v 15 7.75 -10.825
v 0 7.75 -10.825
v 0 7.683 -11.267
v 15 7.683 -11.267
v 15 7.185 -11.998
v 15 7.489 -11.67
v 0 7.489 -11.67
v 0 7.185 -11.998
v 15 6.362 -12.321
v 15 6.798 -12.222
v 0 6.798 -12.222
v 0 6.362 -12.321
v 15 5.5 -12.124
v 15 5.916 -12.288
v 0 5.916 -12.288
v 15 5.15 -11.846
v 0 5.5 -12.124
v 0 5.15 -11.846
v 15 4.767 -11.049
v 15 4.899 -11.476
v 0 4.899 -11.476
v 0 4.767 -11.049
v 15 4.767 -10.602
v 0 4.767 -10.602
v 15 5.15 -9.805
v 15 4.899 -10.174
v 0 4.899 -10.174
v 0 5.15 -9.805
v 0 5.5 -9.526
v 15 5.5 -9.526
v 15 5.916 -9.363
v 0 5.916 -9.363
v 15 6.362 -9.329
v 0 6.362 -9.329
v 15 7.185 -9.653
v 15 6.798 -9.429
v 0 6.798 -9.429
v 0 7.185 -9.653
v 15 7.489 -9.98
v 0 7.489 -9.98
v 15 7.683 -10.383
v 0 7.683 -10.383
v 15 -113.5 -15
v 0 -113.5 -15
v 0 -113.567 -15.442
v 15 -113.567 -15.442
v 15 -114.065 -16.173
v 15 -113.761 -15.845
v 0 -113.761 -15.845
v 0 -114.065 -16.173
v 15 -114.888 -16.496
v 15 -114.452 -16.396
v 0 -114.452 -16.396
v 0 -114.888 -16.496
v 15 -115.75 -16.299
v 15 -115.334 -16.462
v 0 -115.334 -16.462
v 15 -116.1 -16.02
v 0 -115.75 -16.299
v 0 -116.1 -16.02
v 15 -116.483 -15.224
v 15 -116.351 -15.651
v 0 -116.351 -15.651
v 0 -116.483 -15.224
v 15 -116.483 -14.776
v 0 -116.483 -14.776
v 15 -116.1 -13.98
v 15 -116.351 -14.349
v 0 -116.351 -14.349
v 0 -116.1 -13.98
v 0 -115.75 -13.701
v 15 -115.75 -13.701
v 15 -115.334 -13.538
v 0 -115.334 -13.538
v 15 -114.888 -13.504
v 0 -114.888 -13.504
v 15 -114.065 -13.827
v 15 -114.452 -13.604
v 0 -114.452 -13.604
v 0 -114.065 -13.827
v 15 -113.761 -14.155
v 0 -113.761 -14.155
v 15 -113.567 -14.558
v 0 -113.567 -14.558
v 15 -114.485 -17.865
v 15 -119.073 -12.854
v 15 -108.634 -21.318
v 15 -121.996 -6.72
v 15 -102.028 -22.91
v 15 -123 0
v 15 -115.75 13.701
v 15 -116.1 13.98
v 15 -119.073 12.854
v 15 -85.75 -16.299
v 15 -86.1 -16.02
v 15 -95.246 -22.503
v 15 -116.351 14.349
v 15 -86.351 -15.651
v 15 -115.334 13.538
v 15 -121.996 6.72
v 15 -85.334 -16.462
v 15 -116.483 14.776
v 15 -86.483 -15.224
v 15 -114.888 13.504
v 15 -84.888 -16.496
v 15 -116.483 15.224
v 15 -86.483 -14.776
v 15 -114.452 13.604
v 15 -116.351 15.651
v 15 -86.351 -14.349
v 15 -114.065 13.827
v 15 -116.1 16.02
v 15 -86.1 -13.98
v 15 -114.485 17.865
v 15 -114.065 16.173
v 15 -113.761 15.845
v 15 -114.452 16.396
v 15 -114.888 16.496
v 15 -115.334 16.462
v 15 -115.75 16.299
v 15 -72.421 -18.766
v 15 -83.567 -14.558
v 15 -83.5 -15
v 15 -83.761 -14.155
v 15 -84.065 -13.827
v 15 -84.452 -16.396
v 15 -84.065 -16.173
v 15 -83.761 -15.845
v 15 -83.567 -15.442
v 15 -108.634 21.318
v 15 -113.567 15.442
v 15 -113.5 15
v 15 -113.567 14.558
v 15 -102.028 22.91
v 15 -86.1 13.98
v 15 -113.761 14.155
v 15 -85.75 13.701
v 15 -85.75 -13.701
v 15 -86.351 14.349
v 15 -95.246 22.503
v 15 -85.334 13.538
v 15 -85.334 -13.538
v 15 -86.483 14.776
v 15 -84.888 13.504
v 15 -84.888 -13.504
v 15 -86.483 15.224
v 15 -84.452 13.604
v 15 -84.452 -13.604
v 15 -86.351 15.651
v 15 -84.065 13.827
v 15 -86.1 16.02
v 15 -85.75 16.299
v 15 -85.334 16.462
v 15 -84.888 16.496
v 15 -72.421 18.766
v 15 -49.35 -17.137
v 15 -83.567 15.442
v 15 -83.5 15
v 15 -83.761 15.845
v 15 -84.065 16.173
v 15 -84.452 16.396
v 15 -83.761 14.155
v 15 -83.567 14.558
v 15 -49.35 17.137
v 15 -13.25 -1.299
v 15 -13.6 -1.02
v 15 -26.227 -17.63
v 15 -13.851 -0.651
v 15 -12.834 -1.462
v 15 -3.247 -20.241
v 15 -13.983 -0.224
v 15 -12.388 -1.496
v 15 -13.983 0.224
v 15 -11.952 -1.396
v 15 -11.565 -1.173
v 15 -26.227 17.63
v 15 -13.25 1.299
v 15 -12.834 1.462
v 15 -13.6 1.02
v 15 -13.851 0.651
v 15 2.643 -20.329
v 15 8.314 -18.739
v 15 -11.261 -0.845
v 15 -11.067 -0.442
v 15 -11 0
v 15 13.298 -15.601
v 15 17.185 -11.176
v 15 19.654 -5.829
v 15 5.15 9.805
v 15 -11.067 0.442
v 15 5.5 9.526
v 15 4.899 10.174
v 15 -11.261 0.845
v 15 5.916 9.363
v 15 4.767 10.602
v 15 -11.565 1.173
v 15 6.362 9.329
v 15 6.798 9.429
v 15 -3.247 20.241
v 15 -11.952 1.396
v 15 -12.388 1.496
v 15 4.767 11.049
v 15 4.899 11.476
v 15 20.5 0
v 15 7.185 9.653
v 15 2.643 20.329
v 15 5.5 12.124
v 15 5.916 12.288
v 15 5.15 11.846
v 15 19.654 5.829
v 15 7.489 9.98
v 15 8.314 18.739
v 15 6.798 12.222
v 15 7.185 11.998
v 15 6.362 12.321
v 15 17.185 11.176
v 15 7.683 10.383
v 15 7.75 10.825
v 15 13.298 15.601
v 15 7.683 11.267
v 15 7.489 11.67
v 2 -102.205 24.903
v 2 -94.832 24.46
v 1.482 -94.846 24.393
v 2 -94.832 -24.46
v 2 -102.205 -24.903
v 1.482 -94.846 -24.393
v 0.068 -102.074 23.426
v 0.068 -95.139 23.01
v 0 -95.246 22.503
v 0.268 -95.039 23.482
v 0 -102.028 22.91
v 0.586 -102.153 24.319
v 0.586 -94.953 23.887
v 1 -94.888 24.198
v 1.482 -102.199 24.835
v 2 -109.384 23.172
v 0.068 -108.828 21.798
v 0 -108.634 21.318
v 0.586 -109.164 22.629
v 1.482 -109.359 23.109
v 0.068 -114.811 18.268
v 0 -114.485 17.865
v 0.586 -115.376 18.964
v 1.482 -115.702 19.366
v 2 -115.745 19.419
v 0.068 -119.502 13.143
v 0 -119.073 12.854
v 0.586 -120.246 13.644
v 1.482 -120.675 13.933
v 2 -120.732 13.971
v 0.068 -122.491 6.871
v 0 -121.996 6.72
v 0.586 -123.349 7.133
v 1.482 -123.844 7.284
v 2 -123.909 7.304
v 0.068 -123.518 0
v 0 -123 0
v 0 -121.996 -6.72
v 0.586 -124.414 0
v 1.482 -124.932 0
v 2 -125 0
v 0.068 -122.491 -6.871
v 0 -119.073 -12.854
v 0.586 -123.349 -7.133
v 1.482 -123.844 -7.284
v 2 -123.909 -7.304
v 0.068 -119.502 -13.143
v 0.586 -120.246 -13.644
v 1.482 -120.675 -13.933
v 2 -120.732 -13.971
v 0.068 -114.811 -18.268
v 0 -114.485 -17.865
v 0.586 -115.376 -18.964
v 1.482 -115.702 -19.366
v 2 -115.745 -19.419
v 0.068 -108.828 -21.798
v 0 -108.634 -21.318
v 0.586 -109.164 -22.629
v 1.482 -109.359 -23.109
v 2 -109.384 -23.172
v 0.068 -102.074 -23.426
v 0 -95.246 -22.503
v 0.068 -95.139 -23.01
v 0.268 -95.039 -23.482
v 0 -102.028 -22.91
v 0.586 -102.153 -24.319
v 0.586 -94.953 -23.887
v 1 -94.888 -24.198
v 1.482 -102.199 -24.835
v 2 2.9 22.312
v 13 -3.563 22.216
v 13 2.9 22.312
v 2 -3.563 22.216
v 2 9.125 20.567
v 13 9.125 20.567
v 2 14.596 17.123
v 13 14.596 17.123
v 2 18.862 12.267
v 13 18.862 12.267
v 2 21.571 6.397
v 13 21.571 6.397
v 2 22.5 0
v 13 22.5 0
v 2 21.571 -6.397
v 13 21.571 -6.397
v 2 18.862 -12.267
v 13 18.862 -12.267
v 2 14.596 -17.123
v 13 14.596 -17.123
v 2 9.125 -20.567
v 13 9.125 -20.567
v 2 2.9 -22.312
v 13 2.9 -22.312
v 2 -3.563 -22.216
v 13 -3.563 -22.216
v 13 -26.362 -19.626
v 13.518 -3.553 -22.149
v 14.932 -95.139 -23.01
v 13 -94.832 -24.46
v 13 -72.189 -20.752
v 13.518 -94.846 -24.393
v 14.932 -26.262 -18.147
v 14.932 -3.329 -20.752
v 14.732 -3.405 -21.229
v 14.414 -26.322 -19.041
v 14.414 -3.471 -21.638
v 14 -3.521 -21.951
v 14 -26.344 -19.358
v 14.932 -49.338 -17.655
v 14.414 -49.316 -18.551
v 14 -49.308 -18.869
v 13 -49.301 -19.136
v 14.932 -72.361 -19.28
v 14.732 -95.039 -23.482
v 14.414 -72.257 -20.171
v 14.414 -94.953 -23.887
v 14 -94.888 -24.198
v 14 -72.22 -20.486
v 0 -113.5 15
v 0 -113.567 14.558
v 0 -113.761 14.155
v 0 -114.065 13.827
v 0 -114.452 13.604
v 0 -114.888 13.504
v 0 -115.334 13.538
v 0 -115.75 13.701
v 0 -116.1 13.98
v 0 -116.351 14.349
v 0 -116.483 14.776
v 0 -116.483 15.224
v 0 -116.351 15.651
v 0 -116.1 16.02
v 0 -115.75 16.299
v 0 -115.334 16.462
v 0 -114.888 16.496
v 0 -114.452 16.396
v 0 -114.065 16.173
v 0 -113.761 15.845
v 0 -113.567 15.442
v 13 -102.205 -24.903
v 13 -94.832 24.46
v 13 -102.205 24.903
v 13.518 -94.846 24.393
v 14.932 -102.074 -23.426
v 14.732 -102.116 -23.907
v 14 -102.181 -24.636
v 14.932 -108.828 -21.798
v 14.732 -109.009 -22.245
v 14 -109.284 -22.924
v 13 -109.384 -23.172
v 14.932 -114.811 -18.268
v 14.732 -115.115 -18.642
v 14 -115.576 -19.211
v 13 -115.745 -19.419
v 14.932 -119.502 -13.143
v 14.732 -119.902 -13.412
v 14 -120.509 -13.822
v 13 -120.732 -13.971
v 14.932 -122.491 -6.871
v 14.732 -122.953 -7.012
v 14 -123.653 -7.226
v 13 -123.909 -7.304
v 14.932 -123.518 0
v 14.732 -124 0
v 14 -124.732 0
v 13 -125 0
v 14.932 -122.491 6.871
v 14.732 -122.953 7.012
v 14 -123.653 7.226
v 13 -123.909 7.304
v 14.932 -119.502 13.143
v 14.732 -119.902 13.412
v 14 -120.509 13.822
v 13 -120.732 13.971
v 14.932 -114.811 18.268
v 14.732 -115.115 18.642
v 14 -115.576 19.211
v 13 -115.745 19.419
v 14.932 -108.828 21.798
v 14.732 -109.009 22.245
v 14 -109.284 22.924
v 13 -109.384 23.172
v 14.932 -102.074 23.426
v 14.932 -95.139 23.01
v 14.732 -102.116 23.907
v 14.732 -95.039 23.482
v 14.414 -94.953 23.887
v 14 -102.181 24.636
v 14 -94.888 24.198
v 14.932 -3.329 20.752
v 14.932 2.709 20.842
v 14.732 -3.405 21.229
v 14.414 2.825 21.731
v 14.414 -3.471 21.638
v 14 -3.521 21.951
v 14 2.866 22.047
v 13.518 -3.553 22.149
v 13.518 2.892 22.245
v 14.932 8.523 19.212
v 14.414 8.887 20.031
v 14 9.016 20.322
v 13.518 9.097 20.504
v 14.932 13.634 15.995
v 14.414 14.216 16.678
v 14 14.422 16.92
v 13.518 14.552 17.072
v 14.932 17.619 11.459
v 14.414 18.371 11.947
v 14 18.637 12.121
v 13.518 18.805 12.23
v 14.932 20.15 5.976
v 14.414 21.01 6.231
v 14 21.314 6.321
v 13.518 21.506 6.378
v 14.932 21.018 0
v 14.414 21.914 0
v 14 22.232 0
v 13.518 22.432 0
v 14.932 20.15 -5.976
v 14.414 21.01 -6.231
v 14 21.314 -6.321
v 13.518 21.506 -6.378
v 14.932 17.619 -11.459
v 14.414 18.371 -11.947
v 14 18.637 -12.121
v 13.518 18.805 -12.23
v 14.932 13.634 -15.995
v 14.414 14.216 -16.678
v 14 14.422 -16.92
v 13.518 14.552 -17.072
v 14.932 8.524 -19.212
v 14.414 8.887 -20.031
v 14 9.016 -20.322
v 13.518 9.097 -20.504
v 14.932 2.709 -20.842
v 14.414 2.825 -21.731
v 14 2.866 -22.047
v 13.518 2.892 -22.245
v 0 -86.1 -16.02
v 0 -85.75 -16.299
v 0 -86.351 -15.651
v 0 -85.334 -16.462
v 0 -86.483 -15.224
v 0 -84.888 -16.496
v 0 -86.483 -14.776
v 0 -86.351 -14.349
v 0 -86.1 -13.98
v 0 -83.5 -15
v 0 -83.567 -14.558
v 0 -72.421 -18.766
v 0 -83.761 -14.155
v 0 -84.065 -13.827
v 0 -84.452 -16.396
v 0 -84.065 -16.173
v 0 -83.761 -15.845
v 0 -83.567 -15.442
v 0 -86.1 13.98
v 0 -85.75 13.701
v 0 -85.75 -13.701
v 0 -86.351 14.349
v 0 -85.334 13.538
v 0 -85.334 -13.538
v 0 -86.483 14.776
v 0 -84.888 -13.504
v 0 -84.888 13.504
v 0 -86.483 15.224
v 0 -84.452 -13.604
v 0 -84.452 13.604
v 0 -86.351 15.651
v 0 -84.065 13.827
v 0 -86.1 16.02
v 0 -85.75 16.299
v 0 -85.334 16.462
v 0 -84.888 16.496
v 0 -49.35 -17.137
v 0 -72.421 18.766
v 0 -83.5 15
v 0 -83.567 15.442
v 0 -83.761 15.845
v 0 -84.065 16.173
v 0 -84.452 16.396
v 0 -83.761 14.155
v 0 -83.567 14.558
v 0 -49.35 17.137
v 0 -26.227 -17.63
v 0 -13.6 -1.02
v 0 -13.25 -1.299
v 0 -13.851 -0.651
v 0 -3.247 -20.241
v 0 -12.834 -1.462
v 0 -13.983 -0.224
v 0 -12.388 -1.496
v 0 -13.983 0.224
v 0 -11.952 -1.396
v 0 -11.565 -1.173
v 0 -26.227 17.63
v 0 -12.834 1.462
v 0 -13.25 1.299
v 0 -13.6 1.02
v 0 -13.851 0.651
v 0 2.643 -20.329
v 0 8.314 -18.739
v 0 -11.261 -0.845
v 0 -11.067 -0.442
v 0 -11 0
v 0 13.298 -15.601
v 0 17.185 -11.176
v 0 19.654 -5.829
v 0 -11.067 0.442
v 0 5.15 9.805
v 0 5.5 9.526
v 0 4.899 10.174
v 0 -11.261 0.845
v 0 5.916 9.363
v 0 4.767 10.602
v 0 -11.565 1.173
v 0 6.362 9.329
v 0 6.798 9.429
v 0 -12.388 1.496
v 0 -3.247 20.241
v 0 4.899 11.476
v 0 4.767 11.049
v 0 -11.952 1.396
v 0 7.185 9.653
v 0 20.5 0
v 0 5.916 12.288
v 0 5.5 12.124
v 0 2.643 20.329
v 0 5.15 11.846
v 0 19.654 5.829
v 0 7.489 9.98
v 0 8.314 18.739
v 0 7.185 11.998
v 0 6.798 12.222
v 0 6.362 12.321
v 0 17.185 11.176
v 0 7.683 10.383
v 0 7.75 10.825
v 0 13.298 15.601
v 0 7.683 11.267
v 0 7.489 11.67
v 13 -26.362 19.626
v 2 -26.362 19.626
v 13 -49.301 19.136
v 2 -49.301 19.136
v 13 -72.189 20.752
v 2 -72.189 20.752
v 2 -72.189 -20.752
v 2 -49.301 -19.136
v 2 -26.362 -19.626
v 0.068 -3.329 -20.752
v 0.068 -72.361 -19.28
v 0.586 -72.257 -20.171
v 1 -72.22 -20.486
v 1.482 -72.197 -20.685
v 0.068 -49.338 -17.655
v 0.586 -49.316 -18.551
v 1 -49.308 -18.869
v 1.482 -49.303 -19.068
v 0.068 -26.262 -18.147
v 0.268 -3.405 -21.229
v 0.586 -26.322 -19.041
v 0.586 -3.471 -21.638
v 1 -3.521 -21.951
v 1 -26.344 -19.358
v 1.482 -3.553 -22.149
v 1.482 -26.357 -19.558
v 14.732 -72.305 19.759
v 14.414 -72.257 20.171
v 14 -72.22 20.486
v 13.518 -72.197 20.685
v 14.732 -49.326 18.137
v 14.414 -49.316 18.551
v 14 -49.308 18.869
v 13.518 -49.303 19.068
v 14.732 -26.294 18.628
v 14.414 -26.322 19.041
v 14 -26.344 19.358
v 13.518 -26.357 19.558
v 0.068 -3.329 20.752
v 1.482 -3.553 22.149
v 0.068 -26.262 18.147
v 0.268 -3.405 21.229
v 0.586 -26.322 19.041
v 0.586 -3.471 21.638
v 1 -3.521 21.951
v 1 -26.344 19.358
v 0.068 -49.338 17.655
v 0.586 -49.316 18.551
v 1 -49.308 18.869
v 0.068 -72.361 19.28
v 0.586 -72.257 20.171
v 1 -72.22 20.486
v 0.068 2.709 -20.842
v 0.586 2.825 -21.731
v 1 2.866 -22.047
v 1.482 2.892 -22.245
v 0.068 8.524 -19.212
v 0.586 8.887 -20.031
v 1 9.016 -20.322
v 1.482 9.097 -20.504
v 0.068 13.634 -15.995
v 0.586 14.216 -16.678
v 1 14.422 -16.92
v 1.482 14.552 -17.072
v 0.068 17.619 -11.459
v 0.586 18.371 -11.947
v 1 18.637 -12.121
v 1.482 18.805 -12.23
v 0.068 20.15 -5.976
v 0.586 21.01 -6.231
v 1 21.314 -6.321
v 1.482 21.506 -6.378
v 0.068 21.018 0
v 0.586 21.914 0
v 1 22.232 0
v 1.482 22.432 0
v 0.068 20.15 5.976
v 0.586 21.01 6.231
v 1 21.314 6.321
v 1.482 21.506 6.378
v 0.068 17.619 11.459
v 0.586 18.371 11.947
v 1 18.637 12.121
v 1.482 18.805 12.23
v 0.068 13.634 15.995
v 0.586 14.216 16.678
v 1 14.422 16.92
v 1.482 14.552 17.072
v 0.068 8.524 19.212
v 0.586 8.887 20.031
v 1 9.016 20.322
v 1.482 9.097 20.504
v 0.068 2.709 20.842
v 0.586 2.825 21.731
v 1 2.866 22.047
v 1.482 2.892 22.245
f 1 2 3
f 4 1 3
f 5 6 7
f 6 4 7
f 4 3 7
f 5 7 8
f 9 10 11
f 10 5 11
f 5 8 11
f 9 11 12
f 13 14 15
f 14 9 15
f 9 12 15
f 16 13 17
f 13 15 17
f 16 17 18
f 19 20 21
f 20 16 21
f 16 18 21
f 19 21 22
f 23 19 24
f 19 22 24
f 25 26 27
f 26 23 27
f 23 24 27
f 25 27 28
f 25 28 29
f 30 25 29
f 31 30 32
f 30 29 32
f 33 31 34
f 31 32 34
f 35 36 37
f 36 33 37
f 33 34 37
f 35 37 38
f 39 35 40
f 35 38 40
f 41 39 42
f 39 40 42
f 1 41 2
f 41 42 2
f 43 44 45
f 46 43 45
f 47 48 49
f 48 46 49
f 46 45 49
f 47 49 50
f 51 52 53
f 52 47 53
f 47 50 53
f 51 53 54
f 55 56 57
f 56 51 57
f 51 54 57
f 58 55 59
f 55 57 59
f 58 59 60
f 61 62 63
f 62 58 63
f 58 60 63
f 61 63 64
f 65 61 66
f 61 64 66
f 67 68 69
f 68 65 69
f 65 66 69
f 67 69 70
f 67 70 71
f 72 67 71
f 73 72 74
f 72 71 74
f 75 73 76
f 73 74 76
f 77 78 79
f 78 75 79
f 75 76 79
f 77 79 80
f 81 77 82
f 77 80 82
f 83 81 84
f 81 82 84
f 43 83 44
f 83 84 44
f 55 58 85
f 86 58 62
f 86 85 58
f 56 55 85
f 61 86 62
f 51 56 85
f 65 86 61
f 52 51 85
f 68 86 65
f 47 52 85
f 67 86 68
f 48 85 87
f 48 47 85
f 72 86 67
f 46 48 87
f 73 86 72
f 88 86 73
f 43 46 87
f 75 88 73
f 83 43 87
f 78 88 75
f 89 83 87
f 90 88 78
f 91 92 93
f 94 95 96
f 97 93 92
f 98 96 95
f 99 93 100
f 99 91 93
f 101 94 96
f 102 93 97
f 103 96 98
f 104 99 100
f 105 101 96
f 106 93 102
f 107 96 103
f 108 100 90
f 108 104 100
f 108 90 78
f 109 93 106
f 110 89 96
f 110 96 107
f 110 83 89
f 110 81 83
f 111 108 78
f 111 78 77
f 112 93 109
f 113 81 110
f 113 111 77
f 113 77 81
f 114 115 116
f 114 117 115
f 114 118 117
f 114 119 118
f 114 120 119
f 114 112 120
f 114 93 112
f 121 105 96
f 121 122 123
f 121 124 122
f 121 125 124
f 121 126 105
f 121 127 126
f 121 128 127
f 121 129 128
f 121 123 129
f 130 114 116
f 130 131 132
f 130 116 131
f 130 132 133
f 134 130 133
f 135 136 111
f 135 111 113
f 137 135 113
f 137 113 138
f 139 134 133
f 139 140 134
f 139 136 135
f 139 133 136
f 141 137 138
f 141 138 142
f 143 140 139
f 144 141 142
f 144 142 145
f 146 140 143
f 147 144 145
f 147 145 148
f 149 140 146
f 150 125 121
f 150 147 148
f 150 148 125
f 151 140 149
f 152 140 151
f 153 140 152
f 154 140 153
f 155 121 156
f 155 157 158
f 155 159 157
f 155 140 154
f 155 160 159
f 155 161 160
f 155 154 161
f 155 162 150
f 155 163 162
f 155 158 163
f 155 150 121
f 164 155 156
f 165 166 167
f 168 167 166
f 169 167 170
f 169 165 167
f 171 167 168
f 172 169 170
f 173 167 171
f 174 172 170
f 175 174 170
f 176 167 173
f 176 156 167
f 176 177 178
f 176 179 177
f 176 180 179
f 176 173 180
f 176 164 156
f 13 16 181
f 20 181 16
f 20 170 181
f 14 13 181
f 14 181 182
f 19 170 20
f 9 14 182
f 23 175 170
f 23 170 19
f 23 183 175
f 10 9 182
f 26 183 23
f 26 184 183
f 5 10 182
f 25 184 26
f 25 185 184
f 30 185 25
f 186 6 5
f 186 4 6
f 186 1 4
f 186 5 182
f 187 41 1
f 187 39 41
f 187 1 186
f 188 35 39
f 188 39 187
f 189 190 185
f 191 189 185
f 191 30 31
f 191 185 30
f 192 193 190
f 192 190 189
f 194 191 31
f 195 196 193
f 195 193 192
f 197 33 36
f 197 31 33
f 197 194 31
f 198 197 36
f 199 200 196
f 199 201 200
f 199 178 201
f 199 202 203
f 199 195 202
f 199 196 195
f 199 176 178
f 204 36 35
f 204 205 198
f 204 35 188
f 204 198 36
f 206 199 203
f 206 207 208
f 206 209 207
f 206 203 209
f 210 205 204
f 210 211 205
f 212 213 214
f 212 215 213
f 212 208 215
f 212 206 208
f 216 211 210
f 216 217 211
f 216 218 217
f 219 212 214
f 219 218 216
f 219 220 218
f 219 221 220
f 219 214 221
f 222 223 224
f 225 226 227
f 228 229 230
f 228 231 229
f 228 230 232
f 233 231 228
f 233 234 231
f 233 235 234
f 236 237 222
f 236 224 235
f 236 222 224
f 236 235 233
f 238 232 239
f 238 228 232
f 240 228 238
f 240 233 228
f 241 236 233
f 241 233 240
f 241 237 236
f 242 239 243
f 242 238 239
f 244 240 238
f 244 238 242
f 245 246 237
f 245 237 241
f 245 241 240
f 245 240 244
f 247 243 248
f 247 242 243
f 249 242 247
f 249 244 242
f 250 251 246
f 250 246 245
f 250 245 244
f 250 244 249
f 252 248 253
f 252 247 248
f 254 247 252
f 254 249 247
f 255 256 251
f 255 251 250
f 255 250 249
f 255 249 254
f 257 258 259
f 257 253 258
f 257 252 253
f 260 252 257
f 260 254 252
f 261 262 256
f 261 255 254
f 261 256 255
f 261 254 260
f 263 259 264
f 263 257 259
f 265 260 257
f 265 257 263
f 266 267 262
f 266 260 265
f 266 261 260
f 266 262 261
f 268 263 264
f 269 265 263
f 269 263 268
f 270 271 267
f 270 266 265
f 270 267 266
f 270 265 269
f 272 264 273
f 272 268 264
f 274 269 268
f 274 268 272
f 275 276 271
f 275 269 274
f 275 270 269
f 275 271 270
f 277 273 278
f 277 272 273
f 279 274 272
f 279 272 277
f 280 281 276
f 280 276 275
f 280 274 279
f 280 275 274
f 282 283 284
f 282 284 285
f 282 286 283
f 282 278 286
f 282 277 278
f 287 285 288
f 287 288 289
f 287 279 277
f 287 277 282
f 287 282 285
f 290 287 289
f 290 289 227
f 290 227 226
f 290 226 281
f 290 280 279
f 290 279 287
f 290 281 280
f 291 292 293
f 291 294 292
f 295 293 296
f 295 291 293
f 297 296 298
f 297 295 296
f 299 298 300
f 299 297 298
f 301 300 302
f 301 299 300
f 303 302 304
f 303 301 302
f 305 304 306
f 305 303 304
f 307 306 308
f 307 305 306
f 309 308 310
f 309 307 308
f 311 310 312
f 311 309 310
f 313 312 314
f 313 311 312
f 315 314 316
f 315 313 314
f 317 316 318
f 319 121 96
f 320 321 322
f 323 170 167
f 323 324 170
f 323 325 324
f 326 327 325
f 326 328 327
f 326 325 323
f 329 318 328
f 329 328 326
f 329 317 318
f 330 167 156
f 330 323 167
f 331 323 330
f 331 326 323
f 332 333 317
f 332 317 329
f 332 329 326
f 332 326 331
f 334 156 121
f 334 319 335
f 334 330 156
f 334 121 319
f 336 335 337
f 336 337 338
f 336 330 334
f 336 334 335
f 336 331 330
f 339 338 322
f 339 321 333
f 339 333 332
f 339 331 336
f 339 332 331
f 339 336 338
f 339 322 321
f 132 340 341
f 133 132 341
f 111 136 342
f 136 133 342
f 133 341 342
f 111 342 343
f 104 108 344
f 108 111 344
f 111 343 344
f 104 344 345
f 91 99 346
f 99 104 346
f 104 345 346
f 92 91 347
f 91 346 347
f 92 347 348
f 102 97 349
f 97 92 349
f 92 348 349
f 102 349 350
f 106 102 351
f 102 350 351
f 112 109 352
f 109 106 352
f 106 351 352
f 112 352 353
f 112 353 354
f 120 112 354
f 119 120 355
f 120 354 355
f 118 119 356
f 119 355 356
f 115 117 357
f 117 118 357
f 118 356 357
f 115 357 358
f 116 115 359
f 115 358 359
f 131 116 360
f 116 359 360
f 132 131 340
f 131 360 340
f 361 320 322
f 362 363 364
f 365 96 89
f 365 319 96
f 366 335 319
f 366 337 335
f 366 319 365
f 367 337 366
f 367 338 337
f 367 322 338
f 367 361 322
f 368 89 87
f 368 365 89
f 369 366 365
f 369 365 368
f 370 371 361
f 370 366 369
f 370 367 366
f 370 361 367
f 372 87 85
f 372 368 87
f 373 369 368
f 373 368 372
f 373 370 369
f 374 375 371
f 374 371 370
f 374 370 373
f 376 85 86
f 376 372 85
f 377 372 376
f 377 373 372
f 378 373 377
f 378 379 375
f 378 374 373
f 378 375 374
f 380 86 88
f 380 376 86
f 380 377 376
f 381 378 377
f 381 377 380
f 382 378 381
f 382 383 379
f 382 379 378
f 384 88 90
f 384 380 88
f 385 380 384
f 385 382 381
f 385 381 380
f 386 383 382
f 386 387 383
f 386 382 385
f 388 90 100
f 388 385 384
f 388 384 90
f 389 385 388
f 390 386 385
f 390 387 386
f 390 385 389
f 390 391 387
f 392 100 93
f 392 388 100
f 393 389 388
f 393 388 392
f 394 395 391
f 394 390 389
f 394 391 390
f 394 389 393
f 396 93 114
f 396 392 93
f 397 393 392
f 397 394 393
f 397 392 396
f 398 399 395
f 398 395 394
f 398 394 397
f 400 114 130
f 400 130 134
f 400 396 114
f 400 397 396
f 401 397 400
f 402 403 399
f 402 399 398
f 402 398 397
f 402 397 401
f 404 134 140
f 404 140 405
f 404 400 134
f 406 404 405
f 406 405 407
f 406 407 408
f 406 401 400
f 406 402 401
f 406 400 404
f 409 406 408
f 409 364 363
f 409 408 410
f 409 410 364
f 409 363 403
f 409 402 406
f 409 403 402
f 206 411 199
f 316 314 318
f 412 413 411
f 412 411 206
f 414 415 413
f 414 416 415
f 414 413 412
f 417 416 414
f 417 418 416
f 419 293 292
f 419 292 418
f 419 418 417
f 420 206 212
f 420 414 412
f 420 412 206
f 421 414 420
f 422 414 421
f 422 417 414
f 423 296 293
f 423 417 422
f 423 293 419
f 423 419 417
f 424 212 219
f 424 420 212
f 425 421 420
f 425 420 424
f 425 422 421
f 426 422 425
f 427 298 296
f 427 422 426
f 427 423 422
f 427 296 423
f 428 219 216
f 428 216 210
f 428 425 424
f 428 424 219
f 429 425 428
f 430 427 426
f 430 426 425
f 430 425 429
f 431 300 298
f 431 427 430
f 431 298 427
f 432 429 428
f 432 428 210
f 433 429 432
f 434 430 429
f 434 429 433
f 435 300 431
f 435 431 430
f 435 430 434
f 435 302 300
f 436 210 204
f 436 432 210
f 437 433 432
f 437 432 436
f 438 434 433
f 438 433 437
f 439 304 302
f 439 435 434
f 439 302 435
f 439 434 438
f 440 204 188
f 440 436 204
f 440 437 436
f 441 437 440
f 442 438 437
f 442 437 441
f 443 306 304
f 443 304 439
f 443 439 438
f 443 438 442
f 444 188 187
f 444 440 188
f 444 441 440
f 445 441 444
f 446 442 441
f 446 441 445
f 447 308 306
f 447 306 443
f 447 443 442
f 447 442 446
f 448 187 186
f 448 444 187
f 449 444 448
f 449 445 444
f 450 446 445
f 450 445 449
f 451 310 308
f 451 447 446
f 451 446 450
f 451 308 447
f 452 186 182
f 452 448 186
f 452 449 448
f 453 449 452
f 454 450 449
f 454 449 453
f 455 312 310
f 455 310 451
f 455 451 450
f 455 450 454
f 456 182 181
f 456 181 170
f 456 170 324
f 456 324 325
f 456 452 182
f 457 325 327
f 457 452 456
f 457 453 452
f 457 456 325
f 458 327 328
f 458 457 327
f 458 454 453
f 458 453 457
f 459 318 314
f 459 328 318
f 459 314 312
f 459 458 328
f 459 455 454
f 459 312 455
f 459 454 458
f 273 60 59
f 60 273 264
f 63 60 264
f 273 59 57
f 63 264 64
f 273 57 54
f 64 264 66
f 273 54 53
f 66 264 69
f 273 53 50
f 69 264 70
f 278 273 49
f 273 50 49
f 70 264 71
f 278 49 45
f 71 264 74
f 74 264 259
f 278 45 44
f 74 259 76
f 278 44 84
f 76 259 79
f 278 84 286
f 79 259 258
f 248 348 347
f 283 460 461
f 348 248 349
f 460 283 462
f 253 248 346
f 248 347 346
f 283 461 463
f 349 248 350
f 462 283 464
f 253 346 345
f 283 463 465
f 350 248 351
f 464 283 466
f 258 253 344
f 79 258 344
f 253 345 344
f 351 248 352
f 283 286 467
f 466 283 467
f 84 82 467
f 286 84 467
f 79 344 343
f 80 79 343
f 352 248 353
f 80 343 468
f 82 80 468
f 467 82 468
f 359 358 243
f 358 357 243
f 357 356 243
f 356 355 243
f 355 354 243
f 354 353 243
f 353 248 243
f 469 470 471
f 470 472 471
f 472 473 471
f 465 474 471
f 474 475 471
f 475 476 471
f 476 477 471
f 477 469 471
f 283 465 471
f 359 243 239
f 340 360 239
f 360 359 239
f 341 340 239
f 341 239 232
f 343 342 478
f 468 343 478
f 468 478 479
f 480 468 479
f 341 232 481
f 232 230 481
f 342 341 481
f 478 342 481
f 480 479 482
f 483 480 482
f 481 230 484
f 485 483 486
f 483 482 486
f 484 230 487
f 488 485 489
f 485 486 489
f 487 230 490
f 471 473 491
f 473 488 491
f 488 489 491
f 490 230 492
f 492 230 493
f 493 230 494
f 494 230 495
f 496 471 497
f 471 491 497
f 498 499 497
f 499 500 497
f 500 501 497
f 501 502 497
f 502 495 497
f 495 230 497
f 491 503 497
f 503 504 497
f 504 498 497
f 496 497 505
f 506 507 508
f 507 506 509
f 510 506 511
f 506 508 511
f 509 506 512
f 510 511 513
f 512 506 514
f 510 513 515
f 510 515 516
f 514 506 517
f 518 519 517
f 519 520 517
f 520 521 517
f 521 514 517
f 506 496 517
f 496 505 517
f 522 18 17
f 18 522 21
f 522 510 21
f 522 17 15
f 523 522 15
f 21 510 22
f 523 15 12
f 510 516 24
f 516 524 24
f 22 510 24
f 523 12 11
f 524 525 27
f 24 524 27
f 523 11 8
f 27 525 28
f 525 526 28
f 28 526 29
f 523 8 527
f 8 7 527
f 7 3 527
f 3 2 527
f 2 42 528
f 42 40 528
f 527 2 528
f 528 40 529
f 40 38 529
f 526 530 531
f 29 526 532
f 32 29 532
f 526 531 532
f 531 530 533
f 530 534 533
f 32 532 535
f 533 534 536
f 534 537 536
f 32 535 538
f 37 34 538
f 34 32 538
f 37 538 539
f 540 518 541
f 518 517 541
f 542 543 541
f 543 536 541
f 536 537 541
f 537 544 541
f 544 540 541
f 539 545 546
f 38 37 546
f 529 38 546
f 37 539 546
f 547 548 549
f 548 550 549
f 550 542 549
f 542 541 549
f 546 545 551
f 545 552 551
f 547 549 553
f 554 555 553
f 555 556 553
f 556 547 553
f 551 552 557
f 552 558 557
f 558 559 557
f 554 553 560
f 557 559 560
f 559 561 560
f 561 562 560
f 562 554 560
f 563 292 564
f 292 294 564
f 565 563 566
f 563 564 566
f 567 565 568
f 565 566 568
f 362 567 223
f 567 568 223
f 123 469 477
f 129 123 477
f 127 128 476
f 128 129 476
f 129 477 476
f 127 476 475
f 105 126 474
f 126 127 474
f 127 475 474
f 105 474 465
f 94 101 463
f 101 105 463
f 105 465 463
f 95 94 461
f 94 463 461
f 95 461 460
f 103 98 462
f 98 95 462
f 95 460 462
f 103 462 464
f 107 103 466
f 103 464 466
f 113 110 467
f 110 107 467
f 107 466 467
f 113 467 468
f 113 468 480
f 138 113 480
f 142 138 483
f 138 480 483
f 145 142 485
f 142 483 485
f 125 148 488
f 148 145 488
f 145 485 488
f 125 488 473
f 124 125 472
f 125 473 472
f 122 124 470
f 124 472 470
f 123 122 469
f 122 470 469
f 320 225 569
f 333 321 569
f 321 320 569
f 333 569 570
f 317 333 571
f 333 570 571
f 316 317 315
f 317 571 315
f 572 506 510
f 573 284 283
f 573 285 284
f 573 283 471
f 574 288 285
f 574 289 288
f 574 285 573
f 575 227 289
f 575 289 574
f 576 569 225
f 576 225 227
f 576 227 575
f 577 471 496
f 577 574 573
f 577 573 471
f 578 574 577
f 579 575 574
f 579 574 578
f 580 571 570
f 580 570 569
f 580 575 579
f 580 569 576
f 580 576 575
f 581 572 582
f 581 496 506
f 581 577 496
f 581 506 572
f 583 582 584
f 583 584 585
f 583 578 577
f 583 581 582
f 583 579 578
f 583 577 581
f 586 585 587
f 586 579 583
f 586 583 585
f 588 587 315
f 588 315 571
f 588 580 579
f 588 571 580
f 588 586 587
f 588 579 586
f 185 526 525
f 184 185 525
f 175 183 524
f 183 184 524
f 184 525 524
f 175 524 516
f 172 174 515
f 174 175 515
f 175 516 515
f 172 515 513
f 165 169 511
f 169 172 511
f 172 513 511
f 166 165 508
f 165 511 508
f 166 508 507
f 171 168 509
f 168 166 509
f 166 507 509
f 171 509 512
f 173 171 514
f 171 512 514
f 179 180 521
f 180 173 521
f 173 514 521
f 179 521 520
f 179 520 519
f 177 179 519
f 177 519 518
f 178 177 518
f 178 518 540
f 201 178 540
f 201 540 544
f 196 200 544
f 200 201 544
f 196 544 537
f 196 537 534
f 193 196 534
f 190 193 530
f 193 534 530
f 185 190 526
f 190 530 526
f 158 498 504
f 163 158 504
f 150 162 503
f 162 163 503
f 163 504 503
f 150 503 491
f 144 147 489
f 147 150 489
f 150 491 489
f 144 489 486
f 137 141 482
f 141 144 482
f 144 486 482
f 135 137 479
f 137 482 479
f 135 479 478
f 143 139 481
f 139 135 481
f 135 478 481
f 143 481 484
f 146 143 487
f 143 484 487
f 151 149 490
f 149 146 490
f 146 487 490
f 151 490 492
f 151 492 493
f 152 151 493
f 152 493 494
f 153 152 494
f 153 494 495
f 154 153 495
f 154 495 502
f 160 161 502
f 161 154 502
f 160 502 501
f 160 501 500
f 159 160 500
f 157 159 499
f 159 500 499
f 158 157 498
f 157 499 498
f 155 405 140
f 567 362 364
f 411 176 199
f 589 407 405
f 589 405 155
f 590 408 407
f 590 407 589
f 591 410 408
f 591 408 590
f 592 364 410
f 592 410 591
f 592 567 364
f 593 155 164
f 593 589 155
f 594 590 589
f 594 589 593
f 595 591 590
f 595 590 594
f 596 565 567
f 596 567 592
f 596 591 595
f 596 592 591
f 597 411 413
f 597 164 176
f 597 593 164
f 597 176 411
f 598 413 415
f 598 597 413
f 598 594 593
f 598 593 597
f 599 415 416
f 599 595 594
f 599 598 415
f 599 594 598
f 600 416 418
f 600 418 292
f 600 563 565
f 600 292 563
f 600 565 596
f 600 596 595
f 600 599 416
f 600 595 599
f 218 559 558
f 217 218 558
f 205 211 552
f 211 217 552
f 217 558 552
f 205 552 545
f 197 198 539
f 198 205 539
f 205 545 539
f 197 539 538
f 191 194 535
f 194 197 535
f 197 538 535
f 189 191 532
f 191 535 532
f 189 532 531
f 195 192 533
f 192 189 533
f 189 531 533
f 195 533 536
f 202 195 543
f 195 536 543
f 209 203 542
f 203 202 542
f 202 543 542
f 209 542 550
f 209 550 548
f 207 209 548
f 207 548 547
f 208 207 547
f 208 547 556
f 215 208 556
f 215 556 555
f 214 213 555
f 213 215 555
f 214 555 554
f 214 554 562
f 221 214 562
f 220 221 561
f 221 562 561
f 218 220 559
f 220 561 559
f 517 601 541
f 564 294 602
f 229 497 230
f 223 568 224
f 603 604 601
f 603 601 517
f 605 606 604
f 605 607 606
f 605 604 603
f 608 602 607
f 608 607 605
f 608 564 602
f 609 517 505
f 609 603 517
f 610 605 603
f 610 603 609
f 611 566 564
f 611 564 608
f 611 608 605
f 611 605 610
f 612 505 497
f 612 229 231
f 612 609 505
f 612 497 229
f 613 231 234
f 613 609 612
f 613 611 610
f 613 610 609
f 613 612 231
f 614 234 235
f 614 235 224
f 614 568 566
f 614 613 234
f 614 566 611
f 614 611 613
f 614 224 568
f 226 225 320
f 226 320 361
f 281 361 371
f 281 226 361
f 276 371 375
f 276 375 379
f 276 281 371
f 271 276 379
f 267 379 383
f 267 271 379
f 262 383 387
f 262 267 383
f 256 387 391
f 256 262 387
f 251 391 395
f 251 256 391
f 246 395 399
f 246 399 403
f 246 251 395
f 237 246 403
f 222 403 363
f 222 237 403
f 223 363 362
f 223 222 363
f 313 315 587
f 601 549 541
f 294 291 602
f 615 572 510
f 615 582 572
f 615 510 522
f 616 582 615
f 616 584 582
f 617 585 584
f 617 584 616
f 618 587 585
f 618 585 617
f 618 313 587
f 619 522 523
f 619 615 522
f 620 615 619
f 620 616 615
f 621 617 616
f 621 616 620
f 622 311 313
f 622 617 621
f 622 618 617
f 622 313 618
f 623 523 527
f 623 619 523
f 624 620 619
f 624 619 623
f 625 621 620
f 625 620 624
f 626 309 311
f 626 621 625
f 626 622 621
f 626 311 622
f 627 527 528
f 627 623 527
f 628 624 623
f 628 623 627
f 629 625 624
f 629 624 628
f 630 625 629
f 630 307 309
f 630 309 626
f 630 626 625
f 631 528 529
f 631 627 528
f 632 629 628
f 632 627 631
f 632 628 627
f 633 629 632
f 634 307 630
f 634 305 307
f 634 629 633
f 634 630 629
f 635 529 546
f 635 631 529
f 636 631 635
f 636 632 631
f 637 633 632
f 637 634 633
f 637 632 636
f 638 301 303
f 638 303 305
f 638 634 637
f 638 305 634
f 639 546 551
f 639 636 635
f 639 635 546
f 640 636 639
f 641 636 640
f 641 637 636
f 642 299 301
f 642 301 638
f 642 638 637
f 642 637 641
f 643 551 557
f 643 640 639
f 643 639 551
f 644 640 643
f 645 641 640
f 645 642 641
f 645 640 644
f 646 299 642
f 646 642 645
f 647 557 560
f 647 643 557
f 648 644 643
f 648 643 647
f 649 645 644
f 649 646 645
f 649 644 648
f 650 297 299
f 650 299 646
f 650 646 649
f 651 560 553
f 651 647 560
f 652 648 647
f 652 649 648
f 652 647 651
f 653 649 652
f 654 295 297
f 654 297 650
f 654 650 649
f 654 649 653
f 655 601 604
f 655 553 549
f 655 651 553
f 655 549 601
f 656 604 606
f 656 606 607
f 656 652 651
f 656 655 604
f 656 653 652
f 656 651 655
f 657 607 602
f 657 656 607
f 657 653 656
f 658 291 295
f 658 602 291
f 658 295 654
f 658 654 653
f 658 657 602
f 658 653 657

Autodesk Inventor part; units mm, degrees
ref_plane "YZ Plane" through (0, 0, 0) normal (1, 0, 0) x (0, 1, 0)
ref_plane "XZ Plane" through (0, 0, 0) normal (0, 1, 0) x (-1, 0, 0)
ref_plane "XY Plane" through (0, 0, 0) normal (0, 0, 1) x (1, 0, 0)
sketch "Sketch1" plane through (0, 0, 0) normal (1, 0, 0) x (0, 1, 0)
  circle A0 centre (0, 0) radius 12.5 construction
  line L0 (6.25, 10.8253) -> (0, 0) construction
  line L1 (0, 0) -> (-12.5, 0) construction
  line L2 (0, 0) -> (6.25, -10.8253) construction
  line L3 (0, 12.5) -> (0, -12.5) construction
  circle A1 centre (6.25, 10.8253) radius 1.5
  circle A2 centre (6.25, -10.8253) radius 1.5
  circle A3 centre (-12.5, 0) radius 1.5
  circle A4 centre (0, 0) radius 22.5
  circle A5 centre (-100, 0) radius 25
  circle A6 centre (-100, 0) radius 21.2132 construction
  arc A7 (-94.8324, 24.4601) -> (-3.5634, 22.216) centre (-43.1562, 269.0609) ccw
  arc A8 (-3.5634, -22.216) -> (-94.8324, -24.4601) centre (-43.1562, -269.0609) ccw
  line L4 (-100, 25) -> (-100, -25) construction
  line L5 (-75, 0) -> (-125, 0) construction
  line L6 (-82.3223, 17.6777) -> (-117.6777, -17.6777) construction
  line L7 (-82.3223, -17.6777) -> (-117.6777, 17.6777) construction
  circle A9 centre (-85, 15) radius 1.5
  circle A10 centre (-85, -15) radius 1.5
  circle A11 centre (-115, -15) radius 1.5
  circle A12 centre (-115, 15) radius 1.5
  point P0 (-94.8324, -24.4601)
  point P1 (-3.5634, -22.216)
  dimension "d4" = 45
  dimension "d6" = 50
  dimension "d0" = 25
  dimension "d1" = 30
  dimension "d2" = 30
  dimension "d3" = 3
  dimension "d8" = 100
  dimension "d9" = 500
  dimension "d10" = 45
  dimension "d11" = 45
  dimension "d12" = 3
  dimension "d15" = 30
extrude "Extrusion1" add sketch "Sketch1" along normal blind 15
fillet "Fillet1" radius 2 8 edges at (15, -49.3012, 19.1365) (15, -125, 0) (15, -49.3012, -19.1365) (15, 22.5, 0) (0, -49.3012, 19.1365) (0, -125, 0) (0, -49.3012, -19.1365) (0, 22.5, 0)
properties part number "leg_demo_8"
